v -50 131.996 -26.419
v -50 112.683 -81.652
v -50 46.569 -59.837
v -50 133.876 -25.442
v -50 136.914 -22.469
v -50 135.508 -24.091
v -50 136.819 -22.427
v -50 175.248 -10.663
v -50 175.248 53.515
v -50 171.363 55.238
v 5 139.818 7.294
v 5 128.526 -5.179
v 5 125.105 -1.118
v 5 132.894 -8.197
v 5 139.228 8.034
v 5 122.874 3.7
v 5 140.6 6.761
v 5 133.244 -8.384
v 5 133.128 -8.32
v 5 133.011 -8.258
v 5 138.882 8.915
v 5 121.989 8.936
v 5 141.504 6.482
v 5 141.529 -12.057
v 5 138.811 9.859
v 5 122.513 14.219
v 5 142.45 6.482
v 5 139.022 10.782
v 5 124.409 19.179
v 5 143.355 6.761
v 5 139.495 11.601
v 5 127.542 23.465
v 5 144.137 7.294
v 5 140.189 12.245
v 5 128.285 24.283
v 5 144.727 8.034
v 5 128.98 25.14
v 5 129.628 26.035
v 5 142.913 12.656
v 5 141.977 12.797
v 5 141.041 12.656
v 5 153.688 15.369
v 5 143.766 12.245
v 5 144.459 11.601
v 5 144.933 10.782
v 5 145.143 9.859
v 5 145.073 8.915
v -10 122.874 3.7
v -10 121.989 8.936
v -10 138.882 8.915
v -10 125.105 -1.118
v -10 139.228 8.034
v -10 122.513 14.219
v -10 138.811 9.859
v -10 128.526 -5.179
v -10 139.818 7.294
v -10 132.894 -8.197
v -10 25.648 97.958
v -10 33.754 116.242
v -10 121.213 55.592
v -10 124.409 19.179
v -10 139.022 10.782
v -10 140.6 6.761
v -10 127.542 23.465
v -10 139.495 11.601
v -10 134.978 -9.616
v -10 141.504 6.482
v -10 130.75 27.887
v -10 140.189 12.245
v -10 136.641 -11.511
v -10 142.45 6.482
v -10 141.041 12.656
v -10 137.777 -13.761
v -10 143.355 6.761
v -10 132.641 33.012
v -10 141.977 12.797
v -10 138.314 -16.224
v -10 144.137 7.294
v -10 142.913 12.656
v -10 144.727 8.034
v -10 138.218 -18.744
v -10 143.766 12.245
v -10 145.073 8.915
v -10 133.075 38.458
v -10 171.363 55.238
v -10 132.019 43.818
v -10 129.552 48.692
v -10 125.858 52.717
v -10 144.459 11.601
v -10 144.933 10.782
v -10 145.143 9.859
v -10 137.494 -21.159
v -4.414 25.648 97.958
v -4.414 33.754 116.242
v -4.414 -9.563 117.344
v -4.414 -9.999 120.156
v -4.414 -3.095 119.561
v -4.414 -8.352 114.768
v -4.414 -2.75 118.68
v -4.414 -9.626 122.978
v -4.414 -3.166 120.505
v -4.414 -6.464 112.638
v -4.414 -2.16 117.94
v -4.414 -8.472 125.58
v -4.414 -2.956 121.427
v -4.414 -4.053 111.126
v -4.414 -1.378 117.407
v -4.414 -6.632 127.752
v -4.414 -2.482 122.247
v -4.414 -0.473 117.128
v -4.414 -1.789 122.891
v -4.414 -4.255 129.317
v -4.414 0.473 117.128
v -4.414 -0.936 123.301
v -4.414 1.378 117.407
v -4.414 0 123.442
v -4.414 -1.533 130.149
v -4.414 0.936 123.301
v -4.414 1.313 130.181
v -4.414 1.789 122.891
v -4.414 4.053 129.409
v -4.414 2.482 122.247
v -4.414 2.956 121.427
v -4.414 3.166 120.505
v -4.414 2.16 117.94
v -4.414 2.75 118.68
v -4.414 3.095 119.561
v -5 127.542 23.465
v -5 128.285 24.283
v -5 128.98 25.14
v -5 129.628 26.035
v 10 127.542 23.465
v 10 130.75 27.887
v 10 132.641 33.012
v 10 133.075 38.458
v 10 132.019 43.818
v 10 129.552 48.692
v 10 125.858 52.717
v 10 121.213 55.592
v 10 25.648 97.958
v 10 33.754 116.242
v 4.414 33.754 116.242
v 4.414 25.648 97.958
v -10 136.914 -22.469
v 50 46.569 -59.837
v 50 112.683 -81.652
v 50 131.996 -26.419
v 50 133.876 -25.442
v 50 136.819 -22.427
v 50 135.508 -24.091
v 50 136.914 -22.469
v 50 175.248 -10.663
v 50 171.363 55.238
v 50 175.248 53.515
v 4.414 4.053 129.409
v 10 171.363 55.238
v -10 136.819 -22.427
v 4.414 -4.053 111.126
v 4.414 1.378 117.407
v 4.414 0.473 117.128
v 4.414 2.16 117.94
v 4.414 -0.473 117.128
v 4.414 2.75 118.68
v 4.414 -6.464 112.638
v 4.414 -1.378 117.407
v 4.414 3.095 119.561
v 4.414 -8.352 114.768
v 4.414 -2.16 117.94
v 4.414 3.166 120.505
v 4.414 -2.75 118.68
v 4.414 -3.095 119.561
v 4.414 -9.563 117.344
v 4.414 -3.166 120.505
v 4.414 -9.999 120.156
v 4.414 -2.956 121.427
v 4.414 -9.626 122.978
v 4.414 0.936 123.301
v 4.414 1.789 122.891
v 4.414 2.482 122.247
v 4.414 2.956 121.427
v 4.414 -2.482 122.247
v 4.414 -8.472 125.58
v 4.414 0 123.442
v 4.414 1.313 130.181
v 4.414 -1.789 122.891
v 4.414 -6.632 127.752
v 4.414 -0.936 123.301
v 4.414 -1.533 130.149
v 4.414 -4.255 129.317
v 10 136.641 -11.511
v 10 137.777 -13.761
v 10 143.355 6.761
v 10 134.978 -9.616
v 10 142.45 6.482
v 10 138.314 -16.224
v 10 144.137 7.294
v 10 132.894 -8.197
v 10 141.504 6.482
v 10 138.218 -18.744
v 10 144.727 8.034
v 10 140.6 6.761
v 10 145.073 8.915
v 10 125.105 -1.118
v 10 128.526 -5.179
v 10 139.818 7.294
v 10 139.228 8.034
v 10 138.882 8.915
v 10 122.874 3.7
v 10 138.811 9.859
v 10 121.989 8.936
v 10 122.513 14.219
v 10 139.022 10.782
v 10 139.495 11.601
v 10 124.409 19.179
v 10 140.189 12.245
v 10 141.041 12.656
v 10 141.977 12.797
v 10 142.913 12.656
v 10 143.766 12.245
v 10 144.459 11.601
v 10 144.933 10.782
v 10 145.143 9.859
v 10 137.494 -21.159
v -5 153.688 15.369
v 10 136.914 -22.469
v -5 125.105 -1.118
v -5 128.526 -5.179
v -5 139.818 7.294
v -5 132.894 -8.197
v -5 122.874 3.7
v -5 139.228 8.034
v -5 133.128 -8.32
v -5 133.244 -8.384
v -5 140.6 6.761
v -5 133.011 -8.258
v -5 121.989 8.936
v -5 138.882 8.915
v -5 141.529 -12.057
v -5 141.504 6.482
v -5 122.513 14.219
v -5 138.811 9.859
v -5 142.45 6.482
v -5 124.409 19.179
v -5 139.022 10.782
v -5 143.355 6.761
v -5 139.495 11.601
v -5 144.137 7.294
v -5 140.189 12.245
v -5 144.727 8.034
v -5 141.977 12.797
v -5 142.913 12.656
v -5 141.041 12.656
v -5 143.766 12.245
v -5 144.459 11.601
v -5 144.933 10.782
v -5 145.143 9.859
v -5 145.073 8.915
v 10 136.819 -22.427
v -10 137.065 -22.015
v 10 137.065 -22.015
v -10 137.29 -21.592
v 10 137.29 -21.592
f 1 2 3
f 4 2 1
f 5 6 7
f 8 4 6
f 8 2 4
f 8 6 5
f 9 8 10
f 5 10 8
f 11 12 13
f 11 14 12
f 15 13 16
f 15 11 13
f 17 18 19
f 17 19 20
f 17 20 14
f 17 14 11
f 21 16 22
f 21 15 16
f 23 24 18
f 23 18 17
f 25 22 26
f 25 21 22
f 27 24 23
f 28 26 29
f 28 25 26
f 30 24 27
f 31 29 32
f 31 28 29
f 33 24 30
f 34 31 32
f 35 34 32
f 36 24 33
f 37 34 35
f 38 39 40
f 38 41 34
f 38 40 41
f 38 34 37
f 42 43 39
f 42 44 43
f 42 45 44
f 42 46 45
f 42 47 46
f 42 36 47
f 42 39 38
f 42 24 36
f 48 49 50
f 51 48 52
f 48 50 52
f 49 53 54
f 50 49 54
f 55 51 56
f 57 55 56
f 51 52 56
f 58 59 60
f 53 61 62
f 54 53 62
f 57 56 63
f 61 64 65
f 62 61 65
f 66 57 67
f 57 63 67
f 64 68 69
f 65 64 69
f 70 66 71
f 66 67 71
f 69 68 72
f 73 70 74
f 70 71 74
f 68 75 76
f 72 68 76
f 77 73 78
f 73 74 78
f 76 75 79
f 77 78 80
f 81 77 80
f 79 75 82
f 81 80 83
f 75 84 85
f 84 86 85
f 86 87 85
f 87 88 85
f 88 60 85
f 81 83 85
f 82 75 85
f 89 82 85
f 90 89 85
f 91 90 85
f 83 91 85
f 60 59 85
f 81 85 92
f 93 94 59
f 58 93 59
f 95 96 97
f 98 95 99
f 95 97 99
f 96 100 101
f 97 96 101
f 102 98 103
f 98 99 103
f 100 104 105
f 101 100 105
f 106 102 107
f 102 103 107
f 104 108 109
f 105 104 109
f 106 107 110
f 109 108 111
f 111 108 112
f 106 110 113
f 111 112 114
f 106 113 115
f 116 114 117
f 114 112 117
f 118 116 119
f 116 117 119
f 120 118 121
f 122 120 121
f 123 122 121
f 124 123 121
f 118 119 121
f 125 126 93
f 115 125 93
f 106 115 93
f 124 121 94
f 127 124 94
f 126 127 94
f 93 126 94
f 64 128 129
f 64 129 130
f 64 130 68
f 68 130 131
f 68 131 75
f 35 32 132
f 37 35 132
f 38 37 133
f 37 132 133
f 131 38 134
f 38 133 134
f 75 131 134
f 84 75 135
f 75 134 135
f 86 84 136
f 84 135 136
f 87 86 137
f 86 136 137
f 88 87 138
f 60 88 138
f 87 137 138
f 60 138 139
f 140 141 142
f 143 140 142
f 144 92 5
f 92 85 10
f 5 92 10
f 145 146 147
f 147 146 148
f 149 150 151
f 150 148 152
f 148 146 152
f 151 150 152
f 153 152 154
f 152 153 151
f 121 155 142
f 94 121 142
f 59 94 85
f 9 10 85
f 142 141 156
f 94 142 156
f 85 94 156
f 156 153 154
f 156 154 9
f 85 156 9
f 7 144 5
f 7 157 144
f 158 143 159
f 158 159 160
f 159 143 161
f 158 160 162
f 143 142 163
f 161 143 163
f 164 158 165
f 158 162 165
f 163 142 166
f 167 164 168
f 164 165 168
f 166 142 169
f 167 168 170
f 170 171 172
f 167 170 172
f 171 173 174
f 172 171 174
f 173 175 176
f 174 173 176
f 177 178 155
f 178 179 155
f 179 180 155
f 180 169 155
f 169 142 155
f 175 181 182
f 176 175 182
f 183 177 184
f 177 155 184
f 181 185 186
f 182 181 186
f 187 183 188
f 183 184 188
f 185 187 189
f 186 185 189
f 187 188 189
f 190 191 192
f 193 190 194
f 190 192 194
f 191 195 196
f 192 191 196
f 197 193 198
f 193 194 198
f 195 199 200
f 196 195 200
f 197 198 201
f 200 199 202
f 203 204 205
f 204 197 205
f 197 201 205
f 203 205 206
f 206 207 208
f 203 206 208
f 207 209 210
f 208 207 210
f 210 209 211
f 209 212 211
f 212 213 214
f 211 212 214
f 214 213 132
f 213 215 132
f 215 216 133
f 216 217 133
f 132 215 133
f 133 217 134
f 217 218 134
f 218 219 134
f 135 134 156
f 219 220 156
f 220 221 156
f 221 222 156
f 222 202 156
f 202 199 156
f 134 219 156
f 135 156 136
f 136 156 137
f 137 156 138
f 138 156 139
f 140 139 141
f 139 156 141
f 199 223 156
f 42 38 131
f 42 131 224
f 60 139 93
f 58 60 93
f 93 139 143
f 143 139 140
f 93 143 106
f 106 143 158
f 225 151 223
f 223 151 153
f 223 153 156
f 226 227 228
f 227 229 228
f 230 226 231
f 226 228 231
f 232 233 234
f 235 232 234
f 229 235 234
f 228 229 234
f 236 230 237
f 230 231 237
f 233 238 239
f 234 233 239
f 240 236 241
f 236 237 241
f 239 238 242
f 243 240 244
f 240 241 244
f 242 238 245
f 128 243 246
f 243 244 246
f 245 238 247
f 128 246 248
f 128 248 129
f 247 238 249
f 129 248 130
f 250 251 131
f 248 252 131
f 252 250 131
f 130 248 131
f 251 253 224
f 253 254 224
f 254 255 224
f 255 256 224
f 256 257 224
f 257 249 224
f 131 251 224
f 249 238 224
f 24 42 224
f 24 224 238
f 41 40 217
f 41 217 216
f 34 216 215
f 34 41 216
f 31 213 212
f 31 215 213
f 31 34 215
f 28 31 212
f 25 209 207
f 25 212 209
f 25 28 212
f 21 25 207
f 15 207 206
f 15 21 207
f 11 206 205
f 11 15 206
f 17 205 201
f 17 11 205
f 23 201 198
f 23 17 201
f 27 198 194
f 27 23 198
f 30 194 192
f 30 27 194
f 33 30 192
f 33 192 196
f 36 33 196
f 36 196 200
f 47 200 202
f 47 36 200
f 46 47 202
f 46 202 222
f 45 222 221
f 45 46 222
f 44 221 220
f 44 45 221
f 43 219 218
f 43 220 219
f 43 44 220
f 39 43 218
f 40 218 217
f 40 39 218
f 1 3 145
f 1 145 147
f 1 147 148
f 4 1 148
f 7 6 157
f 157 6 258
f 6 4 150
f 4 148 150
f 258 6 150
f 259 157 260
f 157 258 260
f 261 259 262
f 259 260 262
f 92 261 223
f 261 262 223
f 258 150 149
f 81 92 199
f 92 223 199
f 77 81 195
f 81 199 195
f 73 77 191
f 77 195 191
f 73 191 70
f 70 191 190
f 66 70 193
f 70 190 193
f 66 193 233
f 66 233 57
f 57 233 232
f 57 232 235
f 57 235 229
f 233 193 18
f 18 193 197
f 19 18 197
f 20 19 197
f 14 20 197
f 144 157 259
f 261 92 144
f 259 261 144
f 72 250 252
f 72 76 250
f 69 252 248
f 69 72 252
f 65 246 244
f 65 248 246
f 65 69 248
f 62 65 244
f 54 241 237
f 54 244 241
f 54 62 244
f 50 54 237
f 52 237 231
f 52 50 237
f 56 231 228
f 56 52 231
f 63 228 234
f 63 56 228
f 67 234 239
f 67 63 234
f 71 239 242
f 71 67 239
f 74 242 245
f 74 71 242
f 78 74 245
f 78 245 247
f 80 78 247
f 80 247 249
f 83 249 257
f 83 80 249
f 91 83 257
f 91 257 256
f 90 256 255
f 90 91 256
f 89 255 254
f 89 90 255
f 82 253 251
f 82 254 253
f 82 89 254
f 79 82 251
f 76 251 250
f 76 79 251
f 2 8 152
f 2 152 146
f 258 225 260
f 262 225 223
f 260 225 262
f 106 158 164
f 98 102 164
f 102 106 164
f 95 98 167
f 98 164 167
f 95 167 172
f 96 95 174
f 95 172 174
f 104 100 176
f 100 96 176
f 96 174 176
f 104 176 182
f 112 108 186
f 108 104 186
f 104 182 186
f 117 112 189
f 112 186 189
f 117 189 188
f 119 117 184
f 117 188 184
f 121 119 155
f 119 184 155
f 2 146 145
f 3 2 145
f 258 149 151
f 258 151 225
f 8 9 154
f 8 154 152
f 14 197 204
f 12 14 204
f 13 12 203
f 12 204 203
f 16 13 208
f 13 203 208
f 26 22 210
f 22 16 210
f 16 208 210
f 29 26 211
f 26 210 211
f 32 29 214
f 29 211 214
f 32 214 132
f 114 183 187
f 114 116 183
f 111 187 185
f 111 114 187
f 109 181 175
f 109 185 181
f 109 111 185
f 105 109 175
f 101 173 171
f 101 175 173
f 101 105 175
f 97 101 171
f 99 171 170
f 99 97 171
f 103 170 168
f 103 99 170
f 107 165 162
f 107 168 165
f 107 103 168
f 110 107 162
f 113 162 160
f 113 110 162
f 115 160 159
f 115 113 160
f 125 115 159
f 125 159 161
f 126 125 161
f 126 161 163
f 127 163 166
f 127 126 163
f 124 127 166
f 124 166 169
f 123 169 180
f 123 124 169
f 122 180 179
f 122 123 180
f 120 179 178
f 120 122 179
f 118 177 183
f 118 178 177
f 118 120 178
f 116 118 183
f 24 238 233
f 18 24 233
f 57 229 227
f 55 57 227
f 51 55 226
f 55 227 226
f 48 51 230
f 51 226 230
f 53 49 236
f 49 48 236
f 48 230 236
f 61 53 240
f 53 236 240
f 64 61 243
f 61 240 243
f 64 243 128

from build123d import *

# Parameters (mm, degrees)
SKETCH1_R           = 3.175
BOSS_EXTRUDE1_DEPTH = 50
CUT_EXTRUDE2_DEPTH  = 85
CUT_EXTRUDE3_DEPTH  = 5


with BuildPart() as part:
    # Sketch1 → Boss-Extrude1 (new, symmetric)
    with BuildSketch(Plane(origin=(0, 0, 0), x_dir=(0, 0, -1), z_dir=(1, 0, 0))):
        with BuildLine():
            Line((81.651944222, 112.683382271), (59.836598551, 46.569389334))
            Line((59.836598551, 46.569389334), (26.418811763, 131.99560075))
            ThreePointArc((26.418811763, 131.99560075), (17.598489936, 138.340405822), (8.196783623, 132.894072472))
            ThreePointArc((8.196783623, 132.894072472), (-6.288509671, 122.256846087), (-23.465130006, 127.542488985))
            ThreePointArc((-23.465130006, 127.542488985), (-41.174252563, 132.730696676), (-55.592419973, 121.213450072))
            Line((-55.592419973, 121.213450072), (-111.125559912, -4.052805204))
            ThreePointArc((-111.125559912, -4.052805204), (-124.320288873, -9.141923757), (-129.409407426, 4.052805204))
            Line((-129.409407426, 4.052805204), (-53.514907077, 175.248236709))
            Line((-53.514907077, 175.248236709), (10.663375069, 175.248236709))
            Line((10.663375069, 175.248236709), (81.651944222, 112.683382271))
        make_face()
        with Locations(Location((-120.267483669, 0, 0), (0, 0, 180))):
            Circle(SKETCH1_R, mode=Mode.SUBTRACT)
        with Locations(Location((-9.621687552, 141.977138307, 0), (0, 0, 180))):
            Circle(SKETCH1_R, mode=Mode.SUBTRACT)
    extrude(amount=BOSS_EXTRUDE1_DEPTH, both=True)

    # Sketch3 → Cut-Extrude2 (cut)
    with BuildSketch(Plane(origin=(0, -60.961450511, 158.231581065), x_dir=(1, 0, 0), z_dir=(0, -0.40528052042874013, -0.9141923756852326))):
        Polygon((50, -254.130320218), (10, -254.130320218), (10, -103.605584332), (4.413734497, -103.605584332), (4.413734497, -45.786353236), (50, -45.786353236), align=None)
        Polygon((-50, -254.130320218), (-50, -45.786353236), (-4.413734497, -45.786353236), (-4.413734497, -103.605584332), (-10, -103.605584332), (-10, -254.130320218), align=None)
    extrude(amount=CUT_EXTRUDE2_DEPTH, mode=Mode.SUBTRACT)

    # Sketch4 → Cut-Extrude3 (cut, symmetric)
    with BuildSketch(Plane(origin=(0, 0, 0), x_dir=(0, 0, -1), z_dir=(1, 0, 0))):
        Polygon((-15.368692055, 153.687872136), (12.057079216, 141.529456524), (-11.845454529, 87.612445941), (-39.271225799, 99.770861554), align=None)
    extrude(amount=CUT_EXTRUDE3_DEPTH, both=True, mode=Mode.SUBTRACT)


solid = part.part
